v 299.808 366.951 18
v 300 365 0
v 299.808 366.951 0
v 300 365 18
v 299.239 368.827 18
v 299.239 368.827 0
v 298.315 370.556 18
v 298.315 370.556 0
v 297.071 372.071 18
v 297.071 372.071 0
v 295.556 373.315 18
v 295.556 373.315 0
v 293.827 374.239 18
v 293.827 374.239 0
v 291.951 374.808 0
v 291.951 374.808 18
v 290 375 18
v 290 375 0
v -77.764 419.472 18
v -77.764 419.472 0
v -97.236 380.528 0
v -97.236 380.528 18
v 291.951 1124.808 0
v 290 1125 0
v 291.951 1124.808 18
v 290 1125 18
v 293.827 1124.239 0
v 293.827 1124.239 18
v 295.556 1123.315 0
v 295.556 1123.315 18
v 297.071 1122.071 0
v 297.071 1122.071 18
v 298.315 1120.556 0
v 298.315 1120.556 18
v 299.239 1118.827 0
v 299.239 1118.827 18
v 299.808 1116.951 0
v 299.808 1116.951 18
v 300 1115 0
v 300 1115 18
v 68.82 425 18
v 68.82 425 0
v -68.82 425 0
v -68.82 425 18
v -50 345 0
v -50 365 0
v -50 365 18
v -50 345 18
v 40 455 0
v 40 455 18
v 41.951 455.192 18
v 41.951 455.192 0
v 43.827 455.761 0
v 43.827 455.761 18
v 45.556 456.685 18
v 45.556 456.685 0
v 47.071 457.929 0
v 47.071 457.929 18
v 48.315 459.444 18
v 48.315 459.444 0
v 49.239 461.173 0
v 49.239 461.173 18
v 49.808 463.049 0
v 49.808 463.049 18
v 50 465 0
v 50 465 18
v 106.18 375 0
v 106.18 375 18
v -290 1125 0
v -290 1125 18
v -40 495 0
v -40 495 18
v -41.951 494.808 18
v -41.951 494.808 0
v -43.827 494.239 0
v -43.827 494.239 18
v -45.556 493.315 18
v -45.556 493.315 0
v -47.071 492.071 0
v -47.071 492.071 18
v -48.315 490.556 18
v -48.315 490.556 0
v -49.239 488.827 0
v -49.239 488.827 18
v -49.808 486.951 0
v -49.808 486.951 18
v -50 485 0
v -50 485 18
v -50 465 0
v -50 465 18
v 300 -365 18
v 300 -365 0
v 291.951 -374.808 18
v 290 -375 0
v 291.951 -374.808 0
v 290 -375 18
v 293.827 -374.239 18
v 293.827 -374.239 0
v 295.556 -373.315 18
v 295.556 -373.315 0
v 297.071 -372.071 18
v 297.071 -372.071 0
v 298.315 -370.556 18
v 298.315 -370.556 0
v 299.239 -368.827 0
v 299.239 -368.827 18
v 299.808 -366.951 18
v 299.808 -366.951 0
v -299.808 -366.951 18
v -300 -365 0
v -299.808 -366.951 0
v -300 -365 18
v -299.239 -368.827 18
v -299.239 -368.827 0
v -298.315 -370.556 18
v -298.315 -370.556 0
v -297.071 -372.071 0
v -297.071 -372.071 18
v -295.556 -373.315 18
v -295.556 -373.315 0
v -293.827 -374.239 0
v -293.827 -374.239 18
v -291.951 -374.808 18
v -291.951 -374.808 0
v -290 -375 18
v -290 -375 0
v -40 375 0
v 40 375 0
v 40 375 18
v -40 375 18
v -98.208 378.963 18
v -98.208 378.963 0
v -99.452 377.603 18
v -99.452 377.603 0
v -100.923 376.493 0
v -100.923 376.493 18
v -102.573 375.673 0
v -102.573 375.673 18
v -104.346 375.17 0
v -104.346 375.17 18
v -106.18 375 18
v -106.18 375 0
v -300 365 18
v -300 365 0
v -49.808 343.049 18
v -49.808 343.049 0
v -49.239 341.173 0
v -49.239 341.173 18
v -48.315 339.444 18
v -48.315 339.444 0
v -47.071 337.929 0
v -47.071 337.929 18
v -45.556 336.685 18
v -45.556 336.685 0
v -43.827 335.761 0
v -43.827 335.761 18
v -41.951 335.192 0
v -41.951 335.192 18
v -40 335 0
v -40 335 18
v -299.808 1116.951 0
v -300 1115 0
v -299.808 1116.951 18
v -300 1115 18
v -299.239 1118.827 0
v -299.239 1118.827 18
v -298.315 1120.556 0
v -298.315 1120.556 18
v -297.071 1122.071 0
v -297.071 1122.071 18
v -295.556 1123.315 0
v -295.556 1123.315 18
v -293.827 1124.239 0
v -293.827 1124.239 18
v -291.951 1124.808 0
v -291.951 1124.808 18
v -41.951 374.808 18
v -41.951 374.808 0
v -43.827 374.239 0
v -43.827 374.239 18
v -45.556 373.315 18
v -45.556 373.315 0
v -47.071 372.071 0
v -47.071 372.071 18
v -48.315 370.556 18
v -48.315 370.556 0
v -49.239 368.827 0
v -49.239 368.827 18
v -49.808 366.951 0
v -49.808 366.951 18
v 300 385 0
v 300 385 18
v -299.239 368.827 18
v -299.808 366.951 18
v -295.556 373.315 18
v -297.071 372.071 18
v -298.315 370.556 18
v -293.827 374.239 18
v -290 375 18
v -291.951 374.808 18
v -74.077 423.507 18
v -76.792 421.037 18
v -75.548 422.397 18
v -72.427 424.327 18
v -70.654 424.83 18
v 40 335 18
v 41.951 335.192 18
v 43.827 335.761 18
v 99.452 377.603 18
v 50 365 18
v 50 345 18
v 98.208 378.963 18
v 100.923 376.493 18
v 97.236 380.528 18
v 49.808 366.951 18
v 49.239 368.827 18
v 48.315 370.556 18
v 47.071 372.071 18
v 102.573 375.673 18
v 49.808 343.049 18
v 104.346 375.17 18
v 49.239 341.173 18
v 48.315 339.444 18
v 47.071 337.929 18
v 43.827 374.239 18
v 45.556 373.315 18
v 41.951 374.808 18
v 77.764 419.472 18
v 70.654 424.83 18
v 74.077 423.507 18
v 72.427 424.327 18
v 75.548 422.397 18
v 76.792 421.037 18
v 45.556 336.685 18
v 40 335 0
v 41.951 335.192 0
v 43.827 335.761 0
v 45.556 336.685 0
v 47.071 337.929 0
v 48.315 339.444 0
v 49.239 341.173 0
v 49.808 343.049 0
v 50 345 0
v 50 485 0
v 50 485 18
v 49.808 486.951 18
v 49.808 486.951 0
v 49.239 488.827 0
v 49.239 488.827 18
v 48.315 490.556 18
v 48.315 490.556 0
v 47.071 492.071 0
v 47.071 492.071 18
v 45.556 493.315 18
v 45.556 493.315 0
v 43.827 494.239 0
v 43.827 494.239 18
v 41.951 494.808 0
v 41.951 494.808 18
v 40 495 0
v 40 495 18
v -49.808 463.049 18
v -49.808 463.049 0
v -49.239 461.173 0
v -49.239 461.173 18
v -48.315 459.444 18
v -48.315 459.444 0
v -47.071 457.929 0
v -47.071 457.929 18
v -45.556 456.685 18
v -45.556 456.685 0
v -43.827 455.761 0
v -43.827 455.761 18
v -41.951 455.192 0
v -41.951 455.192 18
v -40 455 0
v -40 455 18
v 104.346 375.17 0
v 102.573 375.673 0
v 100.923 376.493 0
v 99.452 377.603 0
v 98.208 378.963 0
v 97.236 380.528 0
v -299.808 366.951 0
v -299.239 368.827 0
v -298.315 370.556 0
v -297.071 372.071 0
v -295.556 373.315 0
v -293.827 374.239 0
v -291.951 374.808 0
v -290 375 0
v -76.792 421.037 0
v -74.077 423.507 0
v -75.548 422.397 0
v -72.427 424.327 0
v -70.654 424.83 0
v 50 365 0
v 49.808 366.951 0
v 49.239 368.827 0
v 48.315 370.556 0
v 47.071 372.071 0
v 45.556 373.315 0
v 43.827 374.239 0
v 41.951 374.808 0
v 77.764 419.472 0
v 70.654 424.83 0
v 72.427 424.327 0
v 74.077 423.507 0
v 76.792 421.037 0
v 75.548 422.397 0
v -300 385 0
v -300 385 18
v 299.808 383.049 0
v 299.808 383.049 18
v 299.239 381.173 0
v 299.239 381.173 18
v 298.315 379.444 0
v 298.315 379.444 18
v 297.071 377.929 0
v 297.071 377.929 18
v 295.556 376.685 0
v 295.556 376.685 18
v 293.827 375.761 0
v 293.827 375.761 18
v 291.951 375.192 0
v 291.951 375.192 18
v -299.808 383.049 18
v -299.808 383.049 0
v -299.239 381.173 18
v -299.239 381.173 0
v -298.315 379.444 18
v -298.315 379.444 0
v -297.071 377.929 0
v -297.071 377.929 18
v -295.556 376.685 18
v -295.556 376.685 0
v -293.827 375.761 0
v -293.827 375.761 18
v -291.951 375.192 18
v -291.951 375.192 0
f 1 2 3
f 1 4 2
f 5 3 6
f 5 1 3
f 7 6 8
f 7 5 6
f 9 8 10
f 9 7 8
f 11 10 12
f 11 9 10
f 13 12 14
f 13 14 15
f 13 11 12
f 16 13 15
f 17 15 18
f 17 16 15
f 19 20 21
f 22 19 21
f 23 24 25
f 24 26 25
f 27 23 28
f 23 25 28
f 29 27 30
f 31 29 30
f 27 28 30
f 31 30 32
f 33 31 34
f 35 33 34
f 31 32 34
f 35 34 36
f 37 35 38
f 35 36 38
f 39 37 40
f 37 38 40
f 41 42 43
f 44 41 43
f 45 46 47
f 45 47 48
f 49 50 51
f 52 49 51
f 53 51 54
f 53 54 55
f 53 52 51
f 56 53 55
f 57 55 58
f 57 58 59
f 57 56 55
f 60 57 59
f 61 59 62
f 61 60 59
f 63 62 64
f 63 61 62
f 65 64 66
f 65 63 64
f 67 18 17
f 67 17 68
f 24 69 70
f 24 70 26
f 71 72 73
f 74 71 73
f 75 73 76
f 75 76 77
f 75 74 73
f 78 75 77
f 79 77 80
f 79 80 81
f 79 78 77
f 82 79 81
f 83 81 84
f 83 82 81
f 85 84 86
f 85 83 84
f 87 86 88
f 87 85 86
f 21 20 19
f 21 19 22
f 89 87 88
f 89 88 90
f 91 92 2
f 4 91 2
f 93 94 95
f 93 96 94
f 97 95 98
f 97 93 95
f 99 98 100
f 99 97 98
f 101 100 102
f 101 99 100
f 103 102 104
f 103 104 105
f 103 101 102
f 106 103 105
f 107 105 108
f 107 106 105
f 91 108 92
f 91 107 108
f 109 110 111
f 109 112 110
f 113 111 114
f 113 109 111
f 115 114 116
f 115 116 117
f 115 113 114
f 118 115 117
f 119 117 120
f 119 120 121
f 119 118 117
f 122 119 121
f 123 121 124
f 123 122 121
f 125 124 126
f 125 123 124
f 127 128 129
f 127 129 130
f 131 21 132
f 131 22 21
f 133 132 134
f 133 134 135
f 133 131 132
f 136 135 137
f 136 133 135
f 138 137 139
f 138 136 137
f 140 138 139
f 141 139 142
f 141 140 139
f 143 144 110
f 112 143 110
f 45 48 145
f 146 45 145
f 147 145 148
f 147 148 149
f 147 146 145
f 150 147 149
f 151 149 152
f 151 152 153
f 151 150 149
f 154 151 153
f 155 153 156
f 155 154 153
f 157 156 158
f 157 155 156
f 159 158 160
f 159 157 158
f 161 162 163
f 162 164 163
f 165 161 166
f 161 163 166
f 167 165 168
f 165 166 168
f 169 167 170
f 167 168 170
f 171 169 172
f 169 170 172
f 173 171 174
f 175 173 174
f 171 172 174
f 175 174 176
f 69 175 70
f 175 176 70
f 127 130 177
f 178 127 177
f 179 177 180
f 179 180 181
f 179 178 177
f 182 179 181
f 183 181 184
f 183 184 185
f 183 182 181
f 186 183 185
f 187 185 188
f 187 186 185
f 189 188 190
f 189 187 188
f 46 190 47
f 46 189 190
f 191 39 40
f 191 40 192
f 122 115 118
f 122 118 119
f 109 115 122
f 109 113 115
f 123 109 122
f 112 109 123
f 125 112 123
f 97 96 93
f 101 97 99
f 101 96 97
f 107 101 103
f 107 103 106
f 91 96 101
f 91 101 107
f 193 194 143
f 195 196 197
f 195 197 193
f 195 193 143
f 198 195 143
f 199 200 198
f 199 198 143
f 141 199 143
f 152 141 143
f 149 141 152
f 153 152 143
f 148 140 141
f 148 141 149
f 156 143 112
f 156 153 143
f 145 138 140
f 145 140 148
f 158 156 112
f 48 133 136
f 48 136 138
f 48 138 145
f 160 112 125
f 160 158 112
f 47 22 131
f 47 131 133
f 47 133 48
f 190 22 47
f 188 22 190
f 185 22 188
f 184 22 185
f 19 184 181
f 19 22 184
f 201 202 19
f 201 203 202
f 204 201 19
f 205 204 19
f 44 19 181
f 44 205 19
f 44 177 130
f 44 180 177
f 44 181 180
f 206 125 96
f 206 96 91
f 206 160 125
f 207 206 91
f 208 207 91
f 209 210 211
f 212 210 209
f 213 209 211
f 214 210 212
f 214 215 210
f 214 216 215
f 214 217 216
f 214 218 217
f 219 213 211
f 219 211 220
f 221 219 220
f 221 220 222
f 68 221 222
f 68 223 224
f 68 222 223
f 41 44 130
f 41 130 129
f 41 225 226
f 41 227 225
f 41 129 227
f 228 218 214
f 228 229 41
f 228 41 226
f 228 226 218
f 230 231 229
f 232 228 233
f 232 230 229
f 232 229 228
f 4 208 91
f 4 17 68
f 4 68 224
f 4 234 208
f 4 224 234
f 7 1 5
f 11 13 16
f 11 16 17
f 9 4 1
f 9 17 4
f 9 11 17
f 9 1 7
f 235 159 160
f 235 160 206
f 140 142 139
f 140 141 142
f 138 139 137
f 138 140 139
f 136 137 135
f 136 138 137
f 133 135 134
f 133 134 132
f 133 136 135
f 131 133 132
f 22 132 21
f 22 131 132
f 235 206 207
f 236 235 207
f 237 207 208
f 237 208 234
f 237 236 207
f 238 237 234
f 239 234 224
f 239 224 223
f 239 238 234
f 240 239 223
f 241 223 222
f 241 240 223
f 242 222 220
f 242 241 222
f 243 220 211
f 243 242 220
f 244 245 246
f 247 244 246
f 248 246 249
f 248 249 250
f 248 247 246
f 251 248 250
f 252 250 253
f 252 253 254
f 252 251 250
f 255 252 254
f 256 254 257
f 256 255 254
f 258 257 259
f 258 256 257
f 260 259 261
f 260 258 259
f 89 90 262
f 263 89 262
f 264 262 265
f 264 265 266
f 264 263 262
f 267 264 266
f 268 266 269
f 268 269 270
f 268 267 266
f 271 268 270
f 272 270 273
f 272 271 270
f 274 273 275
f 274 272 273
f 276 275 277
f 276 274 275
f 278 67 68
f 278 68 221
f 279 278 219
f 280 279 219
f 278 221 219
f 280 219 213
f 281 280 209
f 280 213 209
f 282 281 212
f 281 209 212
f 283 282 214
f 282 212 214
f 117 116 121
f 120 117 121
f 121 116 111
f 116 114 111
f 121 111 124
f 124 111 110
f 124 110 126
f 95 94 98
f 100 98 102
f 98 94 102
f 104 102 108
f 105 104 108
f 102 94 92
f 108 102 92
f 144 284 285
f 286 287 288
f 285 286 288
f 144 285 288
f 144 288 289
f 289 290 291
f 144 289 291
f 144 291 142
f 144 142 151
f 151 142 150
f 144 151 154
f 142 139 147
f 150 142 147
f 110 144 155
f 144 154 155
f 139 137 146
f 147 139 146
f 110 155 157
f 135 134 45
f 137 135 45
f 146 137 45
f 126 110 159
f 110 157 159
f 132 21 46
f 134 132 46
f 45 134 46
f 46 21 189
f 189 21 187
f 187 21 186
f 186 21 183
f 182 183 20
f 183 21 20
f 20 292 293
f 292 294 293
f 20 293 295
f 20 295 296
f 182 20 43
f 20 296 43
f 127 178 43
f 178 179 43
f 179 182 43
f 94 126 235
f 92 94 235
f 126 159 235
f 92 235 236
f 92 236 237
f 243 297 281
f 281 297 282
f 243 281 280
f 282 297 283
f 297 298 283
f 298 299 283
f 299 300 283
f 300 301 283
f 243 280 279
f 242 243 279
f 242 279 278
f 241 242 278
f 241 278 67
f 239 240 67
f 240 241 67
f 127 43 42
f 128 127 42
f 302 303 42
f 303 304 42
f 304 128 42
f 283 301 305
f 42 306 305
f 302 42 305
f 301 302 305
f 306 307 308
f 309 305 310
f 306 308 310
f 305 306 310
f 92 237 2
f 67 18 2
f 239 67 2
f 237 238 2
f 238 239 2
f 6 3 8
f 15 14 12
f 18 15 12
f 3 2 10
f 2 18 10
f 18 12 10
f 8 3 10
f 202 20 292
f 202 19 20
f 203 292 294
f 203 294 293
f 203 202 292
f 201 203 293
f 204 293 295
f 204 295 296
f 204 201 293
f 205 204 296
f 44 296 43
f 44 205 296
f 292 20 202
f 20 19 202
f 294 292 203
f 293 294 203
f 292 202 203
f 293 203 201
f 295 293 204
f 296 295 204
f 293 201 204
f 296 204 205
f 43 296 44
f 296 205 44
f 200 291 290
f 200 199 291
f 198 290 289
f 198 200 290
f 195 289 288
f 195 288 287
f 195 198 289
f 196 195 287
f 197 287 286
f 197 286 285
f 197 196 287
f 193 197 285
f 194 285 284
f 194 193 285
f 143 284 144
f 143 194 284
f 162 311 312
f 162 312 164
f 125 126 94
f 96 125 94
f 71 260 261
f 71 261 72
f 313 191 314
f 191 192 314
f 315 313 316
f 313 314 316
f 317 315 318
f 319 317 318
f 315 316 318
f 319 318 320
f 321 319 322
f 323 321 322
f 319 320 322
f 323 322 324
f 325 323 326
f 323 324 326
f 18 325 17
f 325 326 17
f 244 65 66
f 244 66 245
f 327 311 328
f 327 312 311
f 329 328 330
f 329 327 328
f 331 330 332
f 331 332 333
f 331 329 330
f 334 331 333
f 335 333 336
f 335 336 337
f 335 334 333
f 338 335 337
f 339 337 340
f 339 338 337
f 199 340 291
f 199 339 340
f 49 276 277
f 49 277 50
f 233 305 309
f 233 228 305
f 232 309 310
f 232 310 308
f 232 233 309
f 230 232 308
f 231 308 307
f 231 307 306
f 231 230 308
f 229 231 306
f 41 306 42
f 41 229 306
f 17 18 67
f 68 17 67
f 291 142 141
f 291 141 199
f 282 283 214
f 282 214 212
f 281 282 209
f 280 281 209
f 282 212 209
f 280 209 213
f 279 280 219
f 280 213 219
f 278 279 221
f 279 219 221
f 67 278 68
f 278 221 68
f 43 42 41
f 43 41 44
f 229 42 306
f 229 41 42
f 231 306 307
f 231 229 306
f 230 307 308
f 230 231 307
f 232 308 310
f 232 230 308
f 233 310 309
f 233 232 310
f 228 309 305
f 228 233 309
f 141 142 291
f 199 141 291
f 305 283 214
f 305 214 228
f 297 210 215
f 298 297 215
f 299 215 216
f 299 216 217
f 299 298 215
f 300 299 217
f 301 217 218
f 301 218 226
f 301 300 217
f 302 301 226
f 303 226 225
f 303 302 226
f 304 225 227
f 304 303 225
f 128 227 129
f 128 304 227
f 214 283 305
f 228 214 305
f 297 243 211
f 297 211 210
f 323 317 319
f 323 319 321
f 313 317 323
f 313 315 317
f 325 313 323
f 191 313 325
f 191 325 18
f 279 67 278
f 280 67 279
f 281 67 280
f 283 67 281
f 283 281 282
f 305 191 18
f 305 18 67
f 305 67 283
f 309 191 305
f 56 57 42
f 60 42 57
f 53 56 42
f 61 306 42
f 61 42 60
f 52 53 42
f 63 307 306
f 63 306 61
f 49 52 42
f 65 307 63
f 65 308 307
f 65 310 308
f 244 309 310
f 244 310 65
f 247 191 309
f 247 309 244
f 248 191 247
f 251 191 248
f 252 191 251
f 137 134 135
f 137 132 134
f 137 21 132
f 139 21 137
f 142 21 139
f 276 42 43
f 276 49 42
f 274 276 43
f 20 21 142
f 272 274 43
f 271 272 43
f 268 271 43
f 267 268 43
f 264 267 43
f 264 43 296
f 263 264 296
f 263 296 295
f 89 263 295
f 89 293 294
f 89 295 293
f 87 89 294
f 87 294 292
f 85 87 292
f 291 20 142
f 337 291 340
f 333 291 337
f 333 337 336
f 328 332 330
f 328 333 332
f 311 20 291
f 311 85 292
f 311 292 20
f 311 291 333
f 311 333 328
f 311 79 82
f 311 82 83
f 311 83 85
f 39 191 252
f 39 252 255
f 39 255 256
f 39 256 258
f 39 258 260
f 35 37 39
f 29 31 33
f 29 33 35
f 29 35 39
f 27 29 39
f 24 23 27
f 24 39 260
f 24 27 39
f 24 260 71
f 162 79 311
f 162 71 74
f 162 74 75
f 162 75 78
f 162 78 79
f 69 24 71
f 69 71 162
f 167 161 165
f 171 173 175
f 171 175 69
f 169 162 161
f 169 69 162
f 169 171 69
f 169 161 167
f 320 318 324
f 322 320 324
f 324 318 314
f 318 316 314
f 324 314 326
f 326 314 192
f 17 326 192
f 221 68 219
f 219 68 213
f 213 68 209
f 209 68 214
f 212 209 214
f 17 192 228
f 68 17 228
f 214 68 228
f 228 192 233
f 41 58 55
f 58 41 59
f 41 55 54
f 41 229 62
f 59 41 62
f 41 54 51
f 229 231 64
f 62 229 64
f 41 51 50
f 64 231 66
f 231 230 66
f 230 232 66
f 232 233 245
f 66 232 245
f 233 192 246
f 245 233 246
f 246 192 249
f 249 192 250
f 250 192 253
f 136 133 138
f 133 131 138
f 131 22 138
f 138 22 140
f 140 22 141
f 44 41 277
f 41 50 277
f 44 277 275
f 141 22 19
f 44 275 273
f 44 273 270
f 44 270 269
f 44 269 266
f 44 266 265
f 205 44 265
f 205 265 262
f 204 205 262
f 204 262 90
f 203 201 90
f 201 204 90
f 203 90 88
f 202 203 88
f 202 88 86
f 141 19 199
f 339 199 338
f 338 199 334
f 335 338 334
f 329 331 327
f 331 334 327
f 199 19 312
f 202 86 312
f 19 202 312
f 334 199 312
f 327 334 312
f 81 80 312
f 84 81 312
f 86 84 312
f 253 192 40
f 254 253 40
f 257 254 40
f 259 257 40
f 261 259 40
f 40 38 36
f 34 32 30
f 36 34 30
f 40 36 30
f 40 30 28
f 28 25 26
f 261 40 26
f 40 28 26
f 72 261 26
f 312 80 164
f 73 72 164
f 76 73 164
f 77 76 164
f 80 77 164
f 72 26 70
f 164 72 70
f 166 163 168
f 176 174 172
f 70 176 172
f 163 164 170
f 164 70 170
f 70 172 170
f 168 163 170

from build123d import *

# Parameters (mm, degrees)
PAD_DEPTH    = 18
FILLET_R     = 10
FILLET001_R  = 10
FILLET002_R  = 10
PAD001_DEPTH = 18
FILLET003_R  = 10


with BuildPart() as body:
    # Sketch → Pad (new body)
    with BuildSketch(Plane.XY):
        Polygon((-300, -375), (300, -375), (300, 375), (100, 375), (75, 425), (-75, 425), (-100, 375), (-300, 375), align=None)
        with BuildLine():
            Line((-50, 365), (-50, 345))
            ThreePointArc((-50, 345), (-47.071068, 337.928932), (-40, 335))
            Line((-40, 335), (40, 335))
            ThreePointArc((40, 335), (47.071068, 337.928932), (50, 345))
            Line((50, 345), (50, 365))
            ThreePointArc((50, 365), (47.071068, 372.071068), (40, 375))
            Line((40, 375), (-40, 375))
            ThreePointArc((-40, 375), (-47.071068, 372.071068), (-50, 365))
        make_face(mode=Mode.SUBTRACT)
    extrude(amount=PAD_DEPTH)

    # Fillet
    fillet_edges = [body.edges().sort_by_distance(p)[0] for p in [
        (-75, 425, 9),
        (75, 425, 9),
    ]]
    fillet(fillet_edges, radius=FILLET_R)

    # Fillet001
    fillet001_edges = [body.edges().sort_by_distance(p)[0] for p in [
        (-100, 375, 9),
        (100, 375, 9),
    ]]
    fillet(fillet001_edges, radius=FILLET001_R)

    # Fillet002
    fillet002_edges = [body.edges().sort_by_distance(p)[0] for p in [
        (300, 375, 9),
        (-300, 375, 9),
        (-300, -375, 9),
        (300, -375, 9),
    ]]
    fillet(fillet002_edges, radius=FILLET002_R)


with BuildPart() as body001:
    # Sketch001 → Pad001 (new body)
    with BuildSketch(Plane.XY):
        Polygon((-300, 375), (-300, 1125), (300, 1125), (300, 375), (100, 375), (75, 425), (-75, 425), (-100, 375), align=None)
        with BuildLine():
            Line((-50, 485), (-50, 465))
            ThreePointArc((-50, 465), (-47.071068, 457.928932), (-40, 455))
            Line((-40, 455), (40, 455))
            ThreePointArc((40, 455), (47.071068, 457.928932), (50, 465))
            Line((50, 465), (50, 485))
            ThreePointArc((50, 485), (47.071068, 492.071068), (40, 495))
            Line((40, 495), (-40, 495))
            ThreePointArc((-40, 495), (-47.071068, 492.071068), (-50, 485))
        make_face(mode=Mode.SUBTRACT)
    extrude(amount=PAD001_DEPTH)

    # Fillet003
    fillet003_edges = [body001.edges().sort_by_distance(p)[0] for p in [
        (-75, 425, 9),
        (-100, 375, 9),
        (75, 425, 9),
        (100, 375, 9),
        (300, 375, 9),
        (300, 1125, 9),
        (-300, 375, 9),
        (-300, 1125, 9),
    ]]
    fillet(fillet003_edges, radius=FILLET003_R)


solid = Compound([body.part, body001.part])
